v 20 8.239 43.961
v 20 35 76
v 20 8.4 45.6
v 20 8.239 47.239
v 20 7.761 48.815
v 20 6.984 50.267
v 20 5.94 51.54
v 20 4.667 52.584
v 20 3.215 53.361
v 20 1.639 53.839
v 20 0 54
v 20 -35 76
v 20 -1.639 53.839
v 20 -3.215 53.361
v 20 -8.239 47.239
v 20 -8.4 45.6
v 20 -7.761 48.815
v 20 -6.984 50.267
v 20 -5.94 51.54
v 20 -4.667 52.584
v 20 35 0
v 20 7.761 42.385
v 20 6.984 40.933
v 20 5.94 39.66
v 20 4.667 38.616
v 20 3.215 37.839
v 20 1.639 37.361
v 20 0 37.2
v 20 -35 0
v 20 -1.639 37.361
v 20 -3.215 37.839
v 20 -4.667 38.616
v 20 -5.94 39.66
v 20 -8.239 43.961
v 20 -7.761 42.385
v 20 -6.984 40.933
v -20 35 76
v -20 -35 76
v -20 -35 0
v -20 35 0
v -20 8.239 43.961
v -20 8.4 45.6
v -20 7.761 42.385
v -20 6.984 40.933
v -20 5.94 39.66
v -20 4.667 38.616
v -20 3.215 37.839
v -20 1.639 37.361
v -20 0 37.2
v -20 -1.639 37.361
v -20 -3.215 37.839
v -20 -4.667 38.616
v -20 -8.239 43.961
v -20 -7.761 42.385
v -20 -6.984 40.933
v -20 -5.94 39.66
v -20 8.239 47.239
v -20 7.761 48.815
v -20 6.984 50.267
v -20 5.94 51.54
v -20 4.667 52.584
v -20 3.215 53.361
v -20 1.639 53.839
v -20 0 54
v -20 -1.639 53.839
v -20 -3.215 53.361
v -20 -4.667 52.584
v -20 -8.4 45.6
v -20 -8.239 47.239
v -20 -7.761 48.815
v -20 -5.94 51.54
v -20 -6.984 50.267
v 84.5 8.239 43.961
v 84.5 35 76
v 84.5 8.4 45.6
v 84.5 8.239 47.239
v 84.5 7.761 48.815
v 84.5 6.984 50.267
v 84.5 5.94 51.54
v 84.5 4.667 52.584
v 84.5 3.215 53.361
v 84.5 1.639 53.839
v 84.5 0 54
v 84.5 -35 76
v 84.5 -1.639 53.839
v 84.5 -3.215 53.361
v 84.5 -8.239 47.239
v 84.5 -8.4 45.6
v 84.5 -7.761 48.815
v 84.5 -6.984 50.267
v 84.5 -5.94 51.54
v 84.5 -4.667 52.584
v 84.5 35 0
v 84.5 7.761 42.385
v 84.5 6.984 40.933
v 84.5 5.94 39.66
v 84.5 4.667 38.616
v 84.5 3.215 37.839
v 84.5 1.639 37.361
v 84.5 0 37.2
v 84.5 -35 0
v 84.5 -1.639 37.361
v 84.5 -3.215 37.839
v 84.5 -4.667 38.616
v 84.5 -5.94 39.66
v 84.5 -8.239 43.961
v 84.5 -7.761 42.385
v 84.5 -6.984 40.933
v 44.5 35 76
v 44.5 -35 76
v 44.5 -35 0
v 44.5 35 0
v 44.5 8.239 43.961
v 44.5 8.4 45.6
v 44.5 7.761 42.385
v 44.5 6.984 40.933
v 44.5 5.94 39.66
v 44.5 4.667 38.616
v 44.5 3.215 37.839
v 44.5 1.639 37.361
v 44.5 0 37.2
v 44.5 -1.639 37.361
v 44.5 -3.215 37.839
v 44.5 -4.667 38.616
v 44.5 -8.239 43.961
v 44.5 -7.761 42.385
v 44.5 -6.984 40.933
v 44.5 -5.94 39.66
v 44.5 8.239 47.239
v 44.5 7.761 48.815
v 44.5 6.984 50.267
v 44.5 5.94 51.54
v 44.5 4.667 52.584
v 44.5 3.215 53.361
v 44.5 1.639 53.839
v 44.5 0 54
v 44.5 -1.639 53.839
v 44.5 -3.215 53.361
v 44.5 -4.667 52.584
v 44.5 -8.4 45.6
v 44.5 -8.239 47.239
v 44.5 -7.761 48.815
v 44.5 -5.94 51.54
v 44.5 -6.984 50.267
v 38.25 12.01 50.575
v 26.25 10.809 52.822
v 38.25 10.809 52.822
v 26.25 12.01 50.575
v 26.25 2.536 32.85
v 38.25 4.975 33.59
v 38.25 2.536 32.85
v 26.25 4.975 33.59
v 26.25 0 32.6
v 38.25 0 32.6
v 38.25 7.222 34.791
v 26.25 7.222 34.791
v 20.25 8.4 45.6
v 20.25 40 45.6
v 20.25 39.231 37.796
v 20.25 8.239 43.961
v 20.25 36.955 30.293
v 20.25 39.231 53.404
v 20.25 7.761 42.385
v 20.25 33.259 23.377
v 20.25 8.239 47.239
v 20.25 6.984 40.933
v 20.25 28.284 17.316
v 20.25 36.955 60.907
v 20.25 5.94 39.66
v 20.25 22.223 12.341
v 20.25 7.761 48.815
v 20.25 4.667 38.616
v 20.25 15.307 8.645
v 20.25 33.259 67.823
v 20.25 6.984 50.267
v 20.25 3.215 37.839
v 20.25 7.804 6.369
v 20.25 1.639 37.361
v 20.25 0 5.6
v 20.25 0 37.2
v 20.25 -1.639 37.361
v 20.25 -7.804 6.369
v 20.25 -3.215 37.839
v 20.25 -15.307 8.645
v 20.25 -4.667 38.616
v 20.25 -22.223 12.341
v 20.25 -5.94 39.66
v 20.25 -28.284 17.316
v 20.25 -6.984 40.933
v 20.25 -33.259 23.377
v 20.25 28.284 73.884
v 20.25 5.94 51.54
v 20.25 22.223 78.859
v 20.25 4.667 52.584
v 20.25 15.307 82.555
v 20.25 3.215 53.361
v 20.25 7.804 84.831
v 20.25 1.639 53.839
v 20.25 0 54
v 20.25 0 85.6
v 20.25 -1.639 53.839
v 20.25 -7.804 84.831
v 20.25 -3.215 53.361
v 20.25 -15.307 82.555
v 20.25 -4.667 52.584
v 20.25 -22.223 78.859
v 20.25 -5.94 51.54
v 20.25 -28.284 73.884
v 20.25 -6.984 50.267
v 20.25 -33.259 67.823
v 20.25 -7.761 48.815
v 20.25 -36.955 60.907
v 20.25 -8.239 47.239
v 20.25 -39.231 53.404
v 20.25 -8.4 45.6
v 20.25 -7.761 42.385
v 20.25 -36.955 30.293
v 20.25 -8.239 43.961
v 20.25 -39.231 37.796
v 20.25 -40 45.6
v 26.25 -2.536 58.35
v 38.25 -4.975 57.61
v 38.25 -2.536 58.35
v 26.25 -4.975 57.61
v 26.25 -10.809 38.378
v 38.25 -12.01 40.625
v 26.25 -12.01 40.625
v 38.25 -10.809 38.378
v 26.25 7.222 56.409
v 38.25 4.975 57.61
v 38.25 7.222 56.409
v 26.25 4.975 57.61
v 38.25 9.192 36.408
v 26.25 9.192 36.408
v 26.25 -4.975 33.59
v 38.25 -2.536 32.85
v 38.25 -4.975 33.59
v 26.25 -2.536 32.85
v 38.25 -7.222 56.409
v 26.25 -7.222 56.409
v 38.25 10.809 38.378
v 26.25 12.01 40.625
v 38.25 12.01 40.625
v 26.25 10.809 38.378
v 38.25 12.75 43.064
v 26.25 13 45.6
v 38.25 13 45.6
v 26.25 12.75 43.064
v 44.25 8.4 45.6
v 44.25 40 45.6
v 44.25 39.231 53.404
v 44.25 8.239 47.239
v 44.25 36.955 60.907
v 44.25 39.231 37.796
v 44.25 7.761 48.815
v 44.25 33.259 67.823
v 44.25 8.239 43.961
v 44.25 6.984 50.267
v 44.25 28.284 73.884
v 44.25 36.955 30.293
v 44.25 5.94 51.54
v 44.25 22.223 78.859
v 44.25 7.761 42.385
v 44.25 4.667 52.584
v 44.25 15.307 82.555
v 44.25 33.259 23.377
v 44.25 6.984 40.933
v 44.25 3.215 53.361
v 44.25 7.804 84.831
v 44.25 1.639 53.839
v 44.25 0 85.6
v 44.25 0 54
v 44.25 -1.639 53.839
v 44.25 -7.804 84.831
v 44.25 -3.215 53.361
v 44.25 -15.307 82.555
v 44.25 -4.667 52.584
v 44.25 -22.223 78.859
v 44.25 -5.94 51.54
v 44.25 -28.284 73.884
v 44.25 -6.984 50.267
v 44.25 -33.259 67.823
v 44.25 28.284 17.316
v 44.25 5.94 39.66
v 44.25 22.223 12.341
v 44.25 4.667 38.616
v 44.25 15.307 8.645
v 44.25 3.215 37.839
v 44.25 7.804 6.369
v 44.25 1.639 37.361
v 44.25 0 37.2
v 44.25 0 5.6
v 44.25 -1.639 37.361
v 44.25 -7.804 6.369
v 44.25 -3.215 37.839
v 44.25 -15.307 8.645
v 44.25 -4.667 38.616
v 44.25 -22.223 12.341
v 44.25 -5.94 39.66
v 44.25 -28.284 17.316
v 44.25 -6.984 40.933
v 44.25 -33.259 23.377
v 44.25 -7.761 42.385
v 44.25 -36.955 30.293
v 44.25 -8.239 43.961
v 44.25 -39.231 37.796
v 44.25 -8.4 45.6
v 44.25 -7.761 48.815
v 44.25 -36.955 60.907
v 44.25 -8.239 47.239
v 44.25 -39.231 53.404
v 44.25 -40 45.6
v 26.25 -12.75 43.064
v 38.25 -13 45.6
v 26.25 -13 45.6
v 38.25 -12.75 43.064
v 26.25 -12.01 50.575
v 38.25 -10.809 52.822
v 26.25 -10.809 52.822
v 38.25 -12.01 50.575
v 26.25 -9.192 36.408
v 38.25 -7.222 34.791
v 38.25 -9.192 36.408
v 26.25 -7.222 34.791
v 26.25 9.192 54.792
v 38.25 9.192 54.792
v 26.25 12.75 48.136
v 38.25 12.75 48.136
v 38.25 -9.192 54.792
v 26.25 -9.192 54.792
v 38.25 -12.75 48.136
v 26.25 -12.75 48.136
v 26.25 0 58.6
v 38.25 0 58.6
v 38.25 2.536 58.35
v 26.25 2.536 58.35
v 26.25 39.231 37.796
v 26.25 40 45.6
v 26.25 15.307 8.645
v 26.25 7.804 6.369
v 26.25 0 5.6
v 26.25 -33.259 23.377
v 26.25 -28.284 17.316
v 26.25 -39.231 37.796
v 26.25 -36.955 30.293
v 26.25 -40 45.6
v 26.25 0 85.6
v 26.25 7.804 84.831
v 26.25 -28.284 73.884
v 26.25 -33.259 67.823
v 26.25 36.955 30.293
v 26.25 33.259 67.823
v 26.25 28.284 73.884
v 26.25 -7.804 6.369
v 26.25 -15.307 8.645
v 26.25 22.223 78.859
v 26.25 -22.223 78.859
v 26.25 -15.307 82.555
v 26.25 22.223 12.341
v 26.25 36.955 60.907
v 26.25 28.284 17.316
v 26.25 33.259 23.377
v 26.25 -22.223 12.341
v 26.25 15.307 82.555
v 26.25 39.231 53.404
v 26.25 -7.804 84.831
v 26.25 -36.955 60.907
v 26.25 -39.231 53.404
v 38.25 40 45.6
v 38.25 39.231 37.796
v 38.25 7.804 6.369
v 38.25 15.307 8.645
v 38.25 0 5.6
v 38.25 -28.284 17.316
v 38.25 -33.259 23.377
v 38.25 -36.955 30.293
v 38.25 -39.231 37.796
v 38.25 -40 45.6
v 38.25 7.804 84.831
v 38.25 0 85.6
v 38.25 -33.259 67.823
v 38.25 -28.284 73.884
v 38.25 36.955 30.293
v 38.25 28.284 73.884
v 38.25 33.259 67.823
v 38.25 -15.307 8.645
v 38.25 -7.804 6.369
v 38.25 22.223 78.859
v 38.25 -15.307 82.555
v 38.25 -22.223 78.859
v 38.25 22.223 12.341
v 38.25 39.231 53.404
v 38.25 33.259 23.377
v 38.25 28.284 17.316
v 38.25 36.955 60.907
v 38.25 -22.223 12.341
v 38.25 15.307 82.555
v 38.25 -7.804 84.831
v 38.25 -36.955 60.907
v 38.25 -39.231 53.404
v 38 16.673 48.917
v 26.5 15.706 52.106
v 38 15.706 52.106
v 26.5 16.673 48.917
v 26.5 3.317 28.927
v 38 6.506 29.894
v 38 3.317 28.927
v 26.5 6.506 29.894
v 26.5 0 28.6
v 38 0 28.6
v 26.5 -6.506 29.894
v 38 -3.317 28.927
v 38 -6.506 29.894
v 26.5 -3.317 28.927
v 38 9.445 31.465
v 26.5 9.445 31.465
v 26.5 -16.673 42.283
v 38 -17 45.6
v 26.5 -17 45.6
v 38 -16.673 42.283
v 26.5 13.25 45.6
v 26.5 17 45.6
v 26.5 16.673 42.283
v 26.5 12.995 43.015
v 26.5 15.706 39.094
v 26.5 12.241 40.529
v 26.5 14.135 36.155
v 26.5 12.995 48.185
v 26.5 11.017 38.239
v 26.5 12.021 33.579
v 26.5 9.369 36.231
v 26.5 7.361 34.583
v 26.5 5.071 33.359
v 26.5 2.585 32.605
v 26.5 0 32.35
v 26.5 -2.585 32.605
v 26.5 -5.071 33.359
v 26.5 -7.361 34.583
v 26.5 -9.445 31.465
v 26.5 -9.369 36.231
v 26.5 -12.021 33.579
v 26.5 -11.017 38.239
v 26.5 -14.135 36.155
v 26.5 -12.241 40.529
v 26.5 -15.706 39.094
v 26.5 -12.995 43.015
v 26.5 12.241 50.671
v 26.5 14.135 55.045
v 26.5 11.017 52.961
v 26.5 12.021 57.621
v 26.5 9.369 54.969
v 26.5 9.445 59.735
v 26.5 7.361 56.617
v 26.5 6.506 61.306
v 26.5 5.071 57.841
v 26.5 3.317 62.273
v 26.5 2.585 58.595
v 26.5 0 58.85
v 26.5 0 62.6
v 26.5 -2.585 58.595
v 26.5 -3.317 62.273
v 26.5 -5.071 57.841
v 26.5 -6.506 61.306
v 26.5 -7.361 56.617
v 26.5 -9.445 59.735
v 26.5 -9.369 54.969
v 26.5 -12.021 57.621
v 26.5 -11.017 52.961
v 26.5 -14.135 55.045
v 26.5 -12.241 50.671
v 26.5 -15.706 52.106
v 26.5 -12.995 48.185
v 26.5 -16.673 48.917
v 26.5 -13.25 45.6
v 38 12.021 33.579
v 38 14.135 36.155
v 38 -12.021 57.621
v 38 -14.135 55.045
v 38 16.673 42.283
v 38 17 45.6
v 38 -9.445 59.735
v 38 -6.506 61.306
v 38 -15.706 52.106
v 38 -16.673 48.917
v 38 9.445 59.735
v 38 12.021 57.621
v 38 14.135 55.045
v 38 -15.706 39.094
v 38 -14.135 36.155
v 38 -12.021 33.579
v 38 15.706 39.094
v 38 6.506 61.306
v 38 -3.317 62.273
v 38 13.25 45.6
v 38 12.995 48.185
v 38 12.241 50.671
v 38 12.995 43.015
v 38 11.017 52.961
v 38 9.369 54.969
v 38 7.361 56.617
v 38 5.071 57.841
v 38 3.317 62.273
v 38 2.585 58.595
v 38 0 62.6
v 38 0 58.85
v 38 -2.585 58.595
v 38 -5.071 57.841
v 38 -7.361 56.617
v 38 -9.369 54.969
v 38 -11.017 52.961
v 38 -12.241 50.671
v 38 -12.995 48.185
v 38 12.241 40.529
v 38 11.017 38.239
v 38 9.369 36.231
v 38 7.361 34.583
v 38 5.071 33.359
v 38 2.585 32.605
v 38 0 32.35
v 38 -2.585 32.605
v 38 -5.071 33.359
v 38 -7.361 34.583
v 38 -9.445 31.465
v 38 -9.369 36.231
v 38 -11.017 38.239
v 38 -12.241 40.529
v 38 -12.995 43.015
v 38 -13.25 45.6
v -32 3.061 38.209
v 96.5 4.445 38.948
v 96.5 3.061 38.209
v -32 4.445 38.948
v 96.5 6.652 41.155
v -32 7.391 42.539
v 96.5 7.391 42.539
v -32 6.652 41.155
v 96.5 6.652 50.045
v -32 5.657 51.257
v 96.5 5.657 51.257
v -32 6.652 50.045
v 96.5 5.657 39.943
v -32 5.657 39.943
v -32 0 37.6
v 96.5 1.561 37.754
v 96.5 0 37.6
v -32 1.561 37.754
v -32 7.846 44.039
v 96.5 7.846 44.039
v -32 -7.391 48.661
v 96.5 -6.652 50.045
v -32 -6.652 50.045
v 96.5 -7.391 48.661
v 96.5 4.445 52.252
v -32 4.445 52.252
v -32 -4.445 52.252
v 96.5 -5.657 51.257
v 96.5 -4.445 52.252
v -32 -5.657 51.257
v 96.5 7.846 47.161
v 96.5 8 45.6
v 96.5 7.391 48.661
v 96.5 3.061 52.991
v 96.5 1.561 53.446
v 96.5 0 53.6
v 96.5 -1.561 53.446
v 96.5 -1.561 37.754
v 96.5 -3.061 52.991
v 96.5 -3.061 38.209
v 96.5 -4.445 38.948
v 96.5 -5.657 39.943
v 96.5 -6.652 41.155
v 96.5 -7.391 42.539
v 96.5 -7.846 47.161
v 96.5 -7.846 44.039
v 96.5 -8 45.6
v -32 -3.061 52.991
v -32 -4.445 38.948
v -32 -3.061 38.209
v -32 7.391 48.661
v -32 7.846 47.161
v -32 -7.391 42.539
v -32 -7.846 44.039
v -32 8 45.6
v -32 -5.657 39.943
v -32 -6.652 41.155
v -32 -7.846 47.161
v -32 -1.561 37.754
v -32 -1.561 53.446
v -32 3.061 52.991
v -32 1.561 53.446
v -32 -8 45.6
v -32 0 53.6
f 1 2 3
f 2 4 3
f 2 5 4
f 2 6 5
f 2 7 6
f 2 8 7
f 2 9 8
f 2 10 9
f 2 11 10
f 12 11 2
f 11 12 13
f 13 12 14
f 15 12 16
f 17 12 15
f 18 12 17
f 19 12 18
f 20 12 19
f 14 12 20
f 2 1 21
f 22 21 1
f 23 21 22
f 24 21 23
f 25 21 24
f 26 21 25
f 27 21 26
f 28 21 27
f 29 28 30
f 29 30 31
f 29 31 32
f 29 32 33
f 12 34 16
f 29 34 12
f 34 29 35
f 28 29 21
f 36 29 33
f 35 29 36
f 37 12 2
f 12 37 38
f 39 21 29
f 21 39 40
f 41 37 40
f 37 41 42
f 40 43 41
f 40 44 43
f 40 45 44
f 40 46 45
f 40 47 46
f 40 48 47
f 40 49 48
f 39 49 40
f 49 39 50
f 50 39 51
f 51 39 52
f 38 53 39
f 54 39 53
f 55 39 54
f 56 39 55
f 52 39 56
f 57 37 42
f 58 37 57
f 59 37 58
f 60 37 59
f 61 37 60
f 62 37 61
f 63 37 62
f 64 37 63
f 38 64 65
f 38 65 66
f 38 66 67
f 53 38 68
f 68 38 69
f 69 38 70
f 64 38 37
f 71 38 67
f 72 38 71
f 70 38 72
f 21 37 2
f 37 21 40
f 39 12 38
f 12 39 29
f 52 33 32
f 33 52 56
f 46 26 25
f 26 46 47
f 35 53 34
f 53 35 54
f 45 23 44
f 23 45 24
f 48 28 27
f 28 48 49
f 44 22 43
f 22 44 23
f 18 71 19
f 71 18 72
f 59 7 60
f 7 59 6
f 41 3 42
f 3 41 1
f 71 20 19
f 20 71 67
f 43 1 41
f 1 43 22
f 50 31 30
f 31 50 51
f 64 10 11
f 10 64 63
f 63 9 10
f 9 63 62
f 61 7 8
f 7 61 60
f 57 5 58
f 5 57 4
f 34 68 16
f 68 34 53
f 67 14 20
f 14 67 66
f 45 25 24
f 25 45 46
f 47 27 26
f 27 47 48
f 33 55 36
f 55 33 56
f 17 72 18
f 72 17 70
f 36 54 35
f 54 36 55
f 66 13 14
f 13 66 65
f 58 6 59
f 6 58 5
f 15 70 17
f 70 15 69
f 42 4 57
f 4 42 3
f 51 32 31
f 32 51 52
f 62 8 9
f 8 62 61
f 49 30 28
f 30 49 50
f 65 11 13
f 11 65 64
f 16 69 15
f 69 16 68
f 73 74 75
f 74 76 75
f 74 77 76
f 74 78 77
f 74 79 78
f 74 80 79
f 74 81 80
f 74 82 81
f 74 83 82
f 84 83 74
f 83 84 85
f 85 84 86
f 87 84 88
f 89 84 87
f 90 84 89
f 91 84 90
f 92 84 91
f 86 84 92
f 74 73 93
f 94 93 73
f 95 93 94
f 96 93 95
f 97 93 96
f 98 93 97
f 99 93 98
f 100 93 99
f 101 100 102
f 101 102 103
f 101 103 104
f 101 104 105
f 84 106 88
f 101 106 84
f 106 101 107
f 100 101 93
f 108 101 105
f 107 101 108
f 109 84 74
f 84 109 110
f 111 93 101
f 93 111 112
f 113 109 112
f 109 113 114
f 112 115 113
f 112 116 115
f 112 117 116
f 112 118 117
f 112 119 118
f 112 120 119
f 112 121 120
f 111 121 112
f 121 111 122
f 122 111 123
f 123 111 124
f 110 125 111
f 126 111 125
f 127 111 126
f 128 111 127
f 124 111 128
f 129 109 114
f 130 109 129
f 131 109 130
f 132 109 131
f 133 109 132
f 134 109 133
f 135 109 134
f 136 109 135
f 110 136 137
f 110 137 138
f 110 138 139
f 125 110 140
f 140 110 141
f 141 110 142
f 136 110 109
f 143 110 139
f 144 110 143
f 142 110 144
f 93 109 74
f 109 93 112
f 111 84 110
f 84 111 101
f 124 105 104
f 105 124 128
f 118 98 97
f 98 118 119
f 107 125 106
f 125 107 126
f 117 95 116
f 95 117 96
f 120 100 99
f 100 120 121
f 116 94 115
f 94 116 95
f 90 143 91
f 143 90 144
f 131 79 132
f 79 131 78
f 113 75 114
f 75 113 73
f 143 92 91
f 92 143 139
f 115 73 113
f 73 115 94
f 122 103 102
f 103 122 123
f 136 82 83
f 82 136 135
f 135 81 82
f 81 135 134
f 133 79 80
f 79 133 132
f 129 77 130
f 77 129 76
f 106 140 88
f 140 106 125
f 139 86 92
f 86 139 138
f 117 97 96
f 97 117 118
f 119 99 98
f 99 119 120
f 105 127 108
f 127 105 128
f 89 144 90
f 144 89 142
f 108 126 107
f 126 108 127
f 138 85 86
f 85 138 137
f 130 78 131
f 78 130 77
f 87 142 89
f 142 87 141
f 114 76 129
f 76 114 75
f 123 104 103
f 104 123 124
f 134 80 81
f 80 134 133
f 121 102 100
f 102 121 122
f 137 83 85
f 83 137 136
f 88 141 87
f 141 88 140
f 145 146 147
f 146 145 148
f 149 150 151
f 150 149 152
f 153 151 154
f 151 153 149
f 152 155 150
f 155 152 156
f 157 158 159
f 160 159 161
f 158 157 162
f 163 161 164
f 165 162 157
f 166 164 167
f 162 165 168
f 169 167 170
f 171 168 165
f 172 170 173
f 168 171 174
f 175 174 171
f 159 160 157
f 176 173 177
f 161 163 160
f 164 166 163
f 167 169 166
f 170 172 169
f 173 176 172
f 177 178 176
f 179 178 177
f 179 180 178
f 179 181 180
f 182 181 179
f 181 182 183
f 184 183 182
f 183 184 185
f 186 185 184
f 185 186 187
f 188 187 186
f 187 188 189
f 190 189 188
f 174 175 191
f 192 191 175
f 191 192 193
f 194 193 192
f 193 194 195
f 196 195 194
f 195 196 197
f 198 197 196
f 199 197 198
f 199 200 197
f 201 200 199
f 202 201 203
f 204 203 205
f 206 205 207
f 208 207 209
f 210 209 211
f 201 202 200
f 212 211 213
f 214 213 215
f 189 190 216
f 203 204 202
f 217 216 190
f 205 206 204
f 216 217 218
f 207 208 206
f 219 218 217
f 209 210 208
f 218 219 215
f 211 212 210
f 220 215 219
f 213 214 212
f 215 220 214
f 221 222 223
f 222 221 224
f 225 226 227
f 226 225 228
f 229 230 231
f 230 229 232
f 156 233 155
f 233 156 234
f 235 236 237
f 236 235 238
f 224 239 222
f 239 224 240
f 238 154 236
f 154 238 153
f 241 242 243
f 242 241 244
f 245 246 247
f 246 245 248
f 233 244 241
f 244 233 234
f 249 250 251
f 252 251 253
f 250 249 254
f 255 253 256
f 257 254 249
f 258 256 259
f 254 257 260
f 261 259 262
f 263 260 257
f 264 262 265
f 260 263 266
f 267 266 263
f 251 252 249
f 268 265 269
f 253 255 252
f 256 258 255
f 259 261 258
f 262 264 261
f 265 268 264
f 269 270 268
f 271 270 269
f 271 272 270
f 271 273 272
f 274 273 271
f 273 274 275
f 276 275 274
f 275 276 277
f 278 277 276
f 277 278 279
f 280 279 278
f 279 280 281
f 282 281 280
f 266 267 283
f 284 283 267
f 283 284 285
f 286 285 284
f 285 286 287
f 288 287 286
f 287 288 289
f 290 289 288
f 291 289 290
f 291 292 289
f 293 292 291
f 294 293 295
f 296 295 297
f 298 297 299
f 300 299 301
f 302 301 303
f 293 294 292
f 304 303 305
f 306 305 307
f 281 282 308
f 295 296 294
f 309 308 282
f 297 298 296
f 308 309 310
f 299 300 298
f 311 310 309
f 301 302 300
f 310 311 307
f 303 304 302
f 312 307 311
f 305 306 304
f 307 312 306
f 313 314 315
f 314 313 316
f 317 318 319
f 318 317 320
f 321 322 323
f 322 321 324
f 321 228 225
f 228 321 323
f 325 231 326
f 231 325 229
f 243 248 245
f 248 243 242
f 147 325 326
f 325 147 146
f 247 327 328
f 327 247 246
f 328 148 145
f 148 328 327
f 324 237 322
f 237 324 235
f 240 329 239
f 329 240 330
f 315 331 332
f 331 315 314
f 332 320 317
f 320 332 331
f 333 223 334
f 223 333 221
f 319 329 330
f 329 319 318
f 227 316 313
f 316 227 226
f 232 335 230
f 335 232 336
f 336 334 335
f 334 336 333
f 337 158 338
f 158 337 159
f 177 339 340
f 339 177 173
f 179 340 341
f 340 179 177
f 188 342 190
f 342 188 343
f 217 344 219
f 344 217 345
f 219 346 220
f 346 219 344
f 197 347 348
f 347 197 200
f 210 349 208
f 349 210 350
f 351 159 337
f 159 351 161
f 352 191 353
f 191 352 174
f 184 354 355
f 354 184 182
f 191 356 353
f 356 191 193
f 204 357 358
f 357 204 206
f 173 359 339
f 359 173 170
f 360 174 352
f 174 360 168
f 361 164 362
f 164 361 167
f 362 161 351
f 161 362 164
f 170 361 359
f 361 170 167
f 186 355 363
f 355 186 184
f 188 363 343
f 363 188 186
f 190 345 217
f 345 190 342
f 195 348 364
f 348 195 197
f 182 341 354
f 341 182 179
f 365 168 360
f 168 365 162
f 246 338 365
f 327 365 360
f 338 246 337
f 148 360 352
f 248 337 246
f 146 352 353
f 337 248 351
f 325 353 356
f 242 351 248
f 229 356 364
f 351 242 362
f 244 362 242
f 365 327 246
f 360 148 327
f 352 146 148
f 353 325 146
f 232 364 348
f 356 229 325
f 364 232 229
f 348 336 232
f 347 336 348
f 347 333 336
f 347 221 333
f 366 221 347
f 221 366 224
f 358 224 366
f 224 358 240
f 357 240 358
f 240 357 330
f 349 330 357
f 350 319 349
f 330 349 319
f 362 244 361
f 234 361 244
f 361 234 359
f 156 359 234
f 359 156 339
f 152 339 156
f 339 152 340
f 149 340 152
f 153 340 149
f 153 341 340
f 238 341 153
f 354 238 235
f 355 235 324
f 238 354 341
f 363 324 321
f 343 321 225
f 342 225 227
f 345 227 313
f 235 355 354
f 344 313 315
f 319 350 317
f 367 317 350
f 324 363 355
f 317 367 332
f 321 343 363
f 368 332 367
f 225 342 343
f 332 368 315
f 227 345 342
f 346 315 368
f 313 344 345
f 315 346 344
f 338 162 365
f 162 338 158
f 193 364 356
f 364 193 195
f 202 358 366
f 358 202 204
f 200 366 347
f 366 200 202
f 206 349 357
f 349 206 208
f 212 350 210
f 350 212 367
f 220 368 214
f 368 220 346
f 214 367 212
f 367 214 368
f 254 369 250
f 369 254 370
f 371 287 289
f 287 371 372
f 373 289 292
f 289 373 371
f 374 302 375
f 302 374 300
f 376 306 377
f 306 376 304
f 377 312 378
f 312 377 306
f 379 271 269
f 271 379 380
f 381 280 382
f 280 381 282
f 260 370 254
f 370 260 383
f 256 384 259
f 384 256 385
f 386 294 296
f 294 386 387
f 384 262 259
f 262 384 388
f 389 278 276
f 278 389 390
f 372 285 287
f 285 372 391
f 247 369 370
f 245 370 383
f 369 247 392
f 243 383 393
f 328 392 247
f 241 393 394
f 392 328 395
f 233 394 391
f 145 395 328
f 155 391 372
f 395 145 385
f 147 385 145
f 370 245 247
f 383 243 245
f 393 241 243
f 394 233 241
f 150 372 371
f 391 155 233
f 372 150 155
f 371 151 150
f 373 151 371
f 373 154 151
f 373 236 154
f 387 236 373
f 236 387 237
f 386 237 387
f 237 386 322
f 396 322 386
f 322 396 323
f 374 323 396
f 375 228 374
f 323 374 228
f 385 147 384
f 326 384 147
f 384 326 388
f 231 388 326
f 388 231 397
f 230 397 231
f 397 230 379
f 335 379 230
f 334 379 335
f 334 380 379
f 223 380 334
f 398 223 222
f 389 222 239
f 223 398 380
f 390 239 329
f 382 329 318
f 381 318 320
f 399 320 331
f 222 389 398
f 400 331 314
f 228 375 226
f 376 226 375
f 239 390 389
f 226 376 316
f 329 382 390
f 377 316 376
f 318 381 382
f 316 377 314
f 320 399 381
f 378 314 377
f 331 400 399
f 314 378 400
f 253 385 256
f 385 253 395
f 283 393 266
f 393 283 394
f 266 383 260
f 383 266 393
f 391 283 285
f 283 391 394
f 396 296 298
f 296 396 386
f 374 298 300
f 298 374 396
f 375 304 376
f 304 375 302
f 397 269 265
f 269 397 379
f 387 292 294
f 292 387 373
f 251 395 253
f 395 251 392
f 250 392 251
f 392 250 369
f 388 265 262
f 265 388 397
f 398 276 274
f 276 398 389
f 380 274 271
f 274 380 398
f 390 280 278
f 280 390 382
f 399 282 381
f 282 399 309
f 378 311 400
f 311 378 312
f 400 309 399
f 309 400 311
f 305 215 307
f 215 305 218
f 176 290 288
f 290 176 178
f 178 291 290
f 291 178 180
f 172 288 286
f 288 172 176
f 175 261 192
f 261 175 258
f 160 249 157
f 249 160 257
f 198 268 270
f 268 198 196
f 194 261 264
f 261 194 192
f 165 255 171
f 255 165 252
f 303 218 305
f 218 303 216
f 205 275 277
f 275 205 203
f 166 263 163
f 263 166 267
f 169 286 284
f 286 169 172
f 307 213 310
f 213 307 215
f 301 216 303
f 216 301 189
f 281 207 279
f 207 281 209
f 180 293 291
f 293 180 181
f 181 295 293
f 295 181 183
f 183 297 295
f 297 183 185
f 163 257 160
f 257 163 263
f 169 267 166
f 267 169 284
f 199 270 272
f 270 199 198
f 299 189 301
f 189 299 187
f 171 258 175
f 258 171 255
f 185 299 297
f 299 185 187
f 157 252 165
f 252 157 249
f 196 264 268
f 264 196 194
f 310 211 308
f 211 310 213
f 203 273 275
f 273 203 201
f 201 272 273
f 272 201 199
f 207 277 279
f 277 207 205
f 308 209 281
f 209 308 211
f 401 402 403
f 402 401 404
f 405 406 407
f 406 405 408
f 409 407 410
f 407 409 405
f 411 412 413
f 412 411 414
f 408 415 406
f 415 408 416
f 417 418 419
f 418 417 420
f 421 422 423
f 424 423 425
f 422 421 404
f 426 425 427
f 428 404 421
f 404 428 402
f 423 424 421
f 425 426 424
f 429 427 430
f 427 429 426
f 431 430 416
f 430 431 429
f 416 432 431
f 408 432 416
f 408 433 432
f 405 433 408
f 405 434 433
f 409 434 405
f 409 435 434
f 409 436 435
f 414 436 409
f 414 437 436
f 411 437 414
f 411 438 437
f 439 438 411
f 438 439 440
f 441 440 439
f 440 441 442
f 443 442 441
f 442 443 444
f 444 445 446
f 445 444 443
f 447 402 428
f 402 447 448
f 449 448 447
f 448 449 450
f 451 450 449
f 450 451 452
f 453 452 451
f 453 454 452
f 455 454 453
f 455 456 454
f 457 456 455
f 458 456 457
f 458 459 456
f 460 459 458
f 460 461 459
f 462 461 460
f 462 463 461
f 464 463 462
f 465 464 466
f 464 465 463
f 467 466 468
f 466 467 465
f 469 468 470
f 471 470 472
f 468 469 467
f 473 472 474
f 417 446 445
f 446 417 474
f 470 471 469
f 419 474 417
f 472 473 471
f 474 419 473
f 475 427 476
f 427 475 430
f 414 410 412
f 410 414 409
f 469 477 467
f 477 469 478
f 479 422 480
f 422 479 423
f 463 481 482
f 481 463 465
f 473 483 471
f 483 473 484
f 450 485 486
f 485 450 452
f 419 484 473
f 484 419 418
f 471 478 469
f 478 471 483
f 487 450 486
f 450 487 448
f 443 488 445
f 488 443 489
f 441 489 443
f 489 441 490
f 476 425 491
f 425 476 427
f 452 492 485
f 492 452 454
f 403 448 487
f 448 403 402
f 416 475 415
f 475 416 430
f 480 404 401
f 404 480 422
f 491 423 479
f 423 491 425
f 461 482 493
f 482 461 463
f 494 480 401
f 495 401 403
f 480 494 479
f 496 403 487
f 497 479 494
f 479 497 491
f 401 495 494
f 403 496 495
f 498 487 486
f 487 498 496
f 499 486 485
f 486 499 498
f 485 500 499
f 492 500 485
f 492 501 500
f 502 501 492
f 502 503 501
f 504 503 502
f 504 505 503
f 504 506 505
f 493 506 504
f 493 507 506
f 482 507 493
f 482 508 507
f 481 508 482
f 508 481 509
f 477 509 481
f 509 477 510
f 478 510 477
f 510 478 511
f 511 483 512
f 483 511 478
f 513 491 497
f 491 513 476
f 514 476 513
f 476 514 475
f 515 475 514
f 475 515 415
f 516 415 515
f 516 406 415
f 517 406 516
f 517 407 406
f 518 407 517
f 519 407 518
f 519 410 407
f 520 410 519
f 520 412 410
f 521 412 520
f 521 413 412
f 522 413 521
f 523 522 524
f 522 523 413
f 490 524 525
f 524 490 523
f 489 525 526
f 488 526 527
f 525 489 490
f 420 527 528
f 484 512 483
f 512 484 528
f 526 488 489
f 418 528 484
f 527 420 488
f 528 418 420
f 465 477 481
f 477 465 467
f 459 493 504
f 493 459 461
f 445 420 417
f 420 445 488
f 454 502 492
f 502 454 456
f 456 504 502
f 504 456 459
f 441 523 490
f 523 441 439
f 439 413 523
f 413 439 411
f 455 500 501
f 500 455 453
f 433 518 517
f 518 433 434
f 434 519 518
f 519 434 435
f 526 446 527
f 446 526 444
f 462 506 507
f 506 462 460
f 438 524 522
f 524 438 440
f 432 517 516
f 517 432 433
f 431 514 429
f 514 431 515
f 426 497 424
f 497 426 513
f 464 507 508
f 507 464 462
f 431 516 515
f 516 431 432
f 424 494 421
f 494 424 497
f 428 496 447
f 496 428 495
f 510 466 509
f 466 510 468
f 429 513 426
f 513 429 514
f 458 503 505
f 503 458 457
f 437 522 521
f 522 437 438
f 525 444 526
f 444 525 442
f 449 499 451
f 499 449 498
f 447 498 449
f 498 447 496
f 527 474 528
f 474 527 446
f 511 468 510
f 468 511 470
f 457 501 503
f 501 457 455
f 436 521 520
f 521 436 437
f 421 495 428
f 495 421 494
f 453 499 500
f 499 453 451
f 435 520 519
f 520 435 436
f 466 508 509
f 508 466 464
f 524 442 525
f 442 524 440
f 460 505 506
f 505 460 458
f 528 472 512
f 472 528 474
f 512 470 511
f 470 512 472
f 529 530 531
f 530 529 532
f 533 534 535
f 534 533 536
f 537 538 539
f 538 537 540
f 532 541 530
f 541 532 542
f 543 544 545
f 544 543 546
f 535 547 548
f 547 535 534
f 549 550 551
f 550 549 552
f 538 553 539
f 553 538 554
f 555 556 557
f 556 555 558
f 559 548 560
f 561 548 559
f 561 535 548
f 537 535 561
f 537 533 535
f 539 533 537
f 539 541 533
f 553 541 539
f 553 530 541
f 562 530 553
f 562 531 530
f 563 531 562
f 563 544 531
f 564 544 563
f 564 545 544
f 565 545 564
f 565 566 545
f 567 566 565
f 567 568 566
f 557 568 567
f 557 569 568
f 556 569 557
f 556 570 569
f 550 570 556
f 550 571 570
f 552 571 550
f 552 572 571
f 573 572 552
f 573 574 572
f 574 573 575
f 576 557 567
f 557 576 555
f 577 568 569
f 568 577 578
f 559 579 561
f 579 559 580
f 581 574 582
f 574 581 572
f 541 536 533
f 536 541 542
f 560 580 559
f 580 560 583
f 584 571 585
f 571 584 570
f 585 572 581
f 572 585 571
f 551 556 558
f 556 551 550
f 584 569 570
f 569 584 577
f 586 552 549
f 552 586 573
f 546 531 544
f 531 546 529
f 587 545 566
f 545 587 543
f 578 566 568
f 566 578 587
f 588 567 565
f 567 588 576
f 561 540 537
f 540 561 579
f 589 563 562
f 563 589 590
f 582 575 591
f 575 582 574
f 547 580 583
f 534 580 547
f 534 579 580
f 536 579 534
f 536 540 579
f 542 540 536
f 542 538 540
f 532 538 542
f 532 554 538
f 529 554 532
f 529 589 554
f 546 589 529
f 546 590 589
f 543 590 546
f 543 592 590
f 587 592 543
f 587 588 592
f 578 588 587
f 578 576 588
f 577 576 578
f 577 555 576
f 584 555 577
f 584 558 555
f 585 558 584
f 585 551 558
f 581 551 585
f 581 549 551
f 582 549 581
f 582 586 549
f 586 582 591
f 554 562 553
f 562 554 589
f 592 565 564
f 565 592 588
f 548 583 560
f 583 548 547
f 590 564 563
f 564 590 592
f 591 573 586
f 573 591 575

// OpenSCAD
$fn = 32;

// ------------------------------------------------------------------------
// Pulley assembly: d80 pulley with a belt, shaft d16
// Every part is its own module, assembly() places them once.
// ------------------------------------------------------------------------

// --- part 1 ---
module support1() {
  difference() {
    translate([-20, -35, 0]) cube([40, 70, 76]);
    translate([0, 0, 45.6]) rotate([0, 90, 0]) cylinder(h = 42, d = 16.8, center = true);
  }
}

// --- part 2 ---
module support2() {
  difference() {
    translate([-20, -35, 0]) cube([40, 70, 76]);
    translate([0, 0, 45.6]) rotate([0, 90, 0]) cylinder(h = 42, d = 16.8, center = true);
  }
}

// --- part 3 ---
module shaft() {
  translate([0, 0, -64.25]) cylinder(h = 128.5, d = 16);
}

// --- part 4 ---
module pulley() {
  difference() {
    union() {
      cylinder(h = 24, d = 26);
      cylinder(h = 6, d = 80);
      translate([0, 0, 18]) cylinder(h = 6, d = 80);
    }
    translate([0, 0, -1]) cylinder(h = 26, d = 16.8);
  }
}

// --- part 5 ---
module belt() {
  difference() {
      translate([0, 0, 0]) cylinder(h = 11.5, d = 34);
      translate([0, 0, -1]) cylinder(h = 13.5, d = 26.5);
    }
}

// --- assembly ---
module assembly() {
  translate([0, 0, 0]) rotate([0, 0, 0]) support1();
  translate([64.5, 0, 0]) rotate([0, 0, 0]) support2();
  translate([32.25, 0, 45.6]) rotate([0, 90, 0]) shaft();
  translate([20.25, 0, 45.6]) rotate([0, 90, 0]) pulley();
  translate([26.5, 0, 45.6]) rotate([0, 90, 0]) belt();
}

assembly();
